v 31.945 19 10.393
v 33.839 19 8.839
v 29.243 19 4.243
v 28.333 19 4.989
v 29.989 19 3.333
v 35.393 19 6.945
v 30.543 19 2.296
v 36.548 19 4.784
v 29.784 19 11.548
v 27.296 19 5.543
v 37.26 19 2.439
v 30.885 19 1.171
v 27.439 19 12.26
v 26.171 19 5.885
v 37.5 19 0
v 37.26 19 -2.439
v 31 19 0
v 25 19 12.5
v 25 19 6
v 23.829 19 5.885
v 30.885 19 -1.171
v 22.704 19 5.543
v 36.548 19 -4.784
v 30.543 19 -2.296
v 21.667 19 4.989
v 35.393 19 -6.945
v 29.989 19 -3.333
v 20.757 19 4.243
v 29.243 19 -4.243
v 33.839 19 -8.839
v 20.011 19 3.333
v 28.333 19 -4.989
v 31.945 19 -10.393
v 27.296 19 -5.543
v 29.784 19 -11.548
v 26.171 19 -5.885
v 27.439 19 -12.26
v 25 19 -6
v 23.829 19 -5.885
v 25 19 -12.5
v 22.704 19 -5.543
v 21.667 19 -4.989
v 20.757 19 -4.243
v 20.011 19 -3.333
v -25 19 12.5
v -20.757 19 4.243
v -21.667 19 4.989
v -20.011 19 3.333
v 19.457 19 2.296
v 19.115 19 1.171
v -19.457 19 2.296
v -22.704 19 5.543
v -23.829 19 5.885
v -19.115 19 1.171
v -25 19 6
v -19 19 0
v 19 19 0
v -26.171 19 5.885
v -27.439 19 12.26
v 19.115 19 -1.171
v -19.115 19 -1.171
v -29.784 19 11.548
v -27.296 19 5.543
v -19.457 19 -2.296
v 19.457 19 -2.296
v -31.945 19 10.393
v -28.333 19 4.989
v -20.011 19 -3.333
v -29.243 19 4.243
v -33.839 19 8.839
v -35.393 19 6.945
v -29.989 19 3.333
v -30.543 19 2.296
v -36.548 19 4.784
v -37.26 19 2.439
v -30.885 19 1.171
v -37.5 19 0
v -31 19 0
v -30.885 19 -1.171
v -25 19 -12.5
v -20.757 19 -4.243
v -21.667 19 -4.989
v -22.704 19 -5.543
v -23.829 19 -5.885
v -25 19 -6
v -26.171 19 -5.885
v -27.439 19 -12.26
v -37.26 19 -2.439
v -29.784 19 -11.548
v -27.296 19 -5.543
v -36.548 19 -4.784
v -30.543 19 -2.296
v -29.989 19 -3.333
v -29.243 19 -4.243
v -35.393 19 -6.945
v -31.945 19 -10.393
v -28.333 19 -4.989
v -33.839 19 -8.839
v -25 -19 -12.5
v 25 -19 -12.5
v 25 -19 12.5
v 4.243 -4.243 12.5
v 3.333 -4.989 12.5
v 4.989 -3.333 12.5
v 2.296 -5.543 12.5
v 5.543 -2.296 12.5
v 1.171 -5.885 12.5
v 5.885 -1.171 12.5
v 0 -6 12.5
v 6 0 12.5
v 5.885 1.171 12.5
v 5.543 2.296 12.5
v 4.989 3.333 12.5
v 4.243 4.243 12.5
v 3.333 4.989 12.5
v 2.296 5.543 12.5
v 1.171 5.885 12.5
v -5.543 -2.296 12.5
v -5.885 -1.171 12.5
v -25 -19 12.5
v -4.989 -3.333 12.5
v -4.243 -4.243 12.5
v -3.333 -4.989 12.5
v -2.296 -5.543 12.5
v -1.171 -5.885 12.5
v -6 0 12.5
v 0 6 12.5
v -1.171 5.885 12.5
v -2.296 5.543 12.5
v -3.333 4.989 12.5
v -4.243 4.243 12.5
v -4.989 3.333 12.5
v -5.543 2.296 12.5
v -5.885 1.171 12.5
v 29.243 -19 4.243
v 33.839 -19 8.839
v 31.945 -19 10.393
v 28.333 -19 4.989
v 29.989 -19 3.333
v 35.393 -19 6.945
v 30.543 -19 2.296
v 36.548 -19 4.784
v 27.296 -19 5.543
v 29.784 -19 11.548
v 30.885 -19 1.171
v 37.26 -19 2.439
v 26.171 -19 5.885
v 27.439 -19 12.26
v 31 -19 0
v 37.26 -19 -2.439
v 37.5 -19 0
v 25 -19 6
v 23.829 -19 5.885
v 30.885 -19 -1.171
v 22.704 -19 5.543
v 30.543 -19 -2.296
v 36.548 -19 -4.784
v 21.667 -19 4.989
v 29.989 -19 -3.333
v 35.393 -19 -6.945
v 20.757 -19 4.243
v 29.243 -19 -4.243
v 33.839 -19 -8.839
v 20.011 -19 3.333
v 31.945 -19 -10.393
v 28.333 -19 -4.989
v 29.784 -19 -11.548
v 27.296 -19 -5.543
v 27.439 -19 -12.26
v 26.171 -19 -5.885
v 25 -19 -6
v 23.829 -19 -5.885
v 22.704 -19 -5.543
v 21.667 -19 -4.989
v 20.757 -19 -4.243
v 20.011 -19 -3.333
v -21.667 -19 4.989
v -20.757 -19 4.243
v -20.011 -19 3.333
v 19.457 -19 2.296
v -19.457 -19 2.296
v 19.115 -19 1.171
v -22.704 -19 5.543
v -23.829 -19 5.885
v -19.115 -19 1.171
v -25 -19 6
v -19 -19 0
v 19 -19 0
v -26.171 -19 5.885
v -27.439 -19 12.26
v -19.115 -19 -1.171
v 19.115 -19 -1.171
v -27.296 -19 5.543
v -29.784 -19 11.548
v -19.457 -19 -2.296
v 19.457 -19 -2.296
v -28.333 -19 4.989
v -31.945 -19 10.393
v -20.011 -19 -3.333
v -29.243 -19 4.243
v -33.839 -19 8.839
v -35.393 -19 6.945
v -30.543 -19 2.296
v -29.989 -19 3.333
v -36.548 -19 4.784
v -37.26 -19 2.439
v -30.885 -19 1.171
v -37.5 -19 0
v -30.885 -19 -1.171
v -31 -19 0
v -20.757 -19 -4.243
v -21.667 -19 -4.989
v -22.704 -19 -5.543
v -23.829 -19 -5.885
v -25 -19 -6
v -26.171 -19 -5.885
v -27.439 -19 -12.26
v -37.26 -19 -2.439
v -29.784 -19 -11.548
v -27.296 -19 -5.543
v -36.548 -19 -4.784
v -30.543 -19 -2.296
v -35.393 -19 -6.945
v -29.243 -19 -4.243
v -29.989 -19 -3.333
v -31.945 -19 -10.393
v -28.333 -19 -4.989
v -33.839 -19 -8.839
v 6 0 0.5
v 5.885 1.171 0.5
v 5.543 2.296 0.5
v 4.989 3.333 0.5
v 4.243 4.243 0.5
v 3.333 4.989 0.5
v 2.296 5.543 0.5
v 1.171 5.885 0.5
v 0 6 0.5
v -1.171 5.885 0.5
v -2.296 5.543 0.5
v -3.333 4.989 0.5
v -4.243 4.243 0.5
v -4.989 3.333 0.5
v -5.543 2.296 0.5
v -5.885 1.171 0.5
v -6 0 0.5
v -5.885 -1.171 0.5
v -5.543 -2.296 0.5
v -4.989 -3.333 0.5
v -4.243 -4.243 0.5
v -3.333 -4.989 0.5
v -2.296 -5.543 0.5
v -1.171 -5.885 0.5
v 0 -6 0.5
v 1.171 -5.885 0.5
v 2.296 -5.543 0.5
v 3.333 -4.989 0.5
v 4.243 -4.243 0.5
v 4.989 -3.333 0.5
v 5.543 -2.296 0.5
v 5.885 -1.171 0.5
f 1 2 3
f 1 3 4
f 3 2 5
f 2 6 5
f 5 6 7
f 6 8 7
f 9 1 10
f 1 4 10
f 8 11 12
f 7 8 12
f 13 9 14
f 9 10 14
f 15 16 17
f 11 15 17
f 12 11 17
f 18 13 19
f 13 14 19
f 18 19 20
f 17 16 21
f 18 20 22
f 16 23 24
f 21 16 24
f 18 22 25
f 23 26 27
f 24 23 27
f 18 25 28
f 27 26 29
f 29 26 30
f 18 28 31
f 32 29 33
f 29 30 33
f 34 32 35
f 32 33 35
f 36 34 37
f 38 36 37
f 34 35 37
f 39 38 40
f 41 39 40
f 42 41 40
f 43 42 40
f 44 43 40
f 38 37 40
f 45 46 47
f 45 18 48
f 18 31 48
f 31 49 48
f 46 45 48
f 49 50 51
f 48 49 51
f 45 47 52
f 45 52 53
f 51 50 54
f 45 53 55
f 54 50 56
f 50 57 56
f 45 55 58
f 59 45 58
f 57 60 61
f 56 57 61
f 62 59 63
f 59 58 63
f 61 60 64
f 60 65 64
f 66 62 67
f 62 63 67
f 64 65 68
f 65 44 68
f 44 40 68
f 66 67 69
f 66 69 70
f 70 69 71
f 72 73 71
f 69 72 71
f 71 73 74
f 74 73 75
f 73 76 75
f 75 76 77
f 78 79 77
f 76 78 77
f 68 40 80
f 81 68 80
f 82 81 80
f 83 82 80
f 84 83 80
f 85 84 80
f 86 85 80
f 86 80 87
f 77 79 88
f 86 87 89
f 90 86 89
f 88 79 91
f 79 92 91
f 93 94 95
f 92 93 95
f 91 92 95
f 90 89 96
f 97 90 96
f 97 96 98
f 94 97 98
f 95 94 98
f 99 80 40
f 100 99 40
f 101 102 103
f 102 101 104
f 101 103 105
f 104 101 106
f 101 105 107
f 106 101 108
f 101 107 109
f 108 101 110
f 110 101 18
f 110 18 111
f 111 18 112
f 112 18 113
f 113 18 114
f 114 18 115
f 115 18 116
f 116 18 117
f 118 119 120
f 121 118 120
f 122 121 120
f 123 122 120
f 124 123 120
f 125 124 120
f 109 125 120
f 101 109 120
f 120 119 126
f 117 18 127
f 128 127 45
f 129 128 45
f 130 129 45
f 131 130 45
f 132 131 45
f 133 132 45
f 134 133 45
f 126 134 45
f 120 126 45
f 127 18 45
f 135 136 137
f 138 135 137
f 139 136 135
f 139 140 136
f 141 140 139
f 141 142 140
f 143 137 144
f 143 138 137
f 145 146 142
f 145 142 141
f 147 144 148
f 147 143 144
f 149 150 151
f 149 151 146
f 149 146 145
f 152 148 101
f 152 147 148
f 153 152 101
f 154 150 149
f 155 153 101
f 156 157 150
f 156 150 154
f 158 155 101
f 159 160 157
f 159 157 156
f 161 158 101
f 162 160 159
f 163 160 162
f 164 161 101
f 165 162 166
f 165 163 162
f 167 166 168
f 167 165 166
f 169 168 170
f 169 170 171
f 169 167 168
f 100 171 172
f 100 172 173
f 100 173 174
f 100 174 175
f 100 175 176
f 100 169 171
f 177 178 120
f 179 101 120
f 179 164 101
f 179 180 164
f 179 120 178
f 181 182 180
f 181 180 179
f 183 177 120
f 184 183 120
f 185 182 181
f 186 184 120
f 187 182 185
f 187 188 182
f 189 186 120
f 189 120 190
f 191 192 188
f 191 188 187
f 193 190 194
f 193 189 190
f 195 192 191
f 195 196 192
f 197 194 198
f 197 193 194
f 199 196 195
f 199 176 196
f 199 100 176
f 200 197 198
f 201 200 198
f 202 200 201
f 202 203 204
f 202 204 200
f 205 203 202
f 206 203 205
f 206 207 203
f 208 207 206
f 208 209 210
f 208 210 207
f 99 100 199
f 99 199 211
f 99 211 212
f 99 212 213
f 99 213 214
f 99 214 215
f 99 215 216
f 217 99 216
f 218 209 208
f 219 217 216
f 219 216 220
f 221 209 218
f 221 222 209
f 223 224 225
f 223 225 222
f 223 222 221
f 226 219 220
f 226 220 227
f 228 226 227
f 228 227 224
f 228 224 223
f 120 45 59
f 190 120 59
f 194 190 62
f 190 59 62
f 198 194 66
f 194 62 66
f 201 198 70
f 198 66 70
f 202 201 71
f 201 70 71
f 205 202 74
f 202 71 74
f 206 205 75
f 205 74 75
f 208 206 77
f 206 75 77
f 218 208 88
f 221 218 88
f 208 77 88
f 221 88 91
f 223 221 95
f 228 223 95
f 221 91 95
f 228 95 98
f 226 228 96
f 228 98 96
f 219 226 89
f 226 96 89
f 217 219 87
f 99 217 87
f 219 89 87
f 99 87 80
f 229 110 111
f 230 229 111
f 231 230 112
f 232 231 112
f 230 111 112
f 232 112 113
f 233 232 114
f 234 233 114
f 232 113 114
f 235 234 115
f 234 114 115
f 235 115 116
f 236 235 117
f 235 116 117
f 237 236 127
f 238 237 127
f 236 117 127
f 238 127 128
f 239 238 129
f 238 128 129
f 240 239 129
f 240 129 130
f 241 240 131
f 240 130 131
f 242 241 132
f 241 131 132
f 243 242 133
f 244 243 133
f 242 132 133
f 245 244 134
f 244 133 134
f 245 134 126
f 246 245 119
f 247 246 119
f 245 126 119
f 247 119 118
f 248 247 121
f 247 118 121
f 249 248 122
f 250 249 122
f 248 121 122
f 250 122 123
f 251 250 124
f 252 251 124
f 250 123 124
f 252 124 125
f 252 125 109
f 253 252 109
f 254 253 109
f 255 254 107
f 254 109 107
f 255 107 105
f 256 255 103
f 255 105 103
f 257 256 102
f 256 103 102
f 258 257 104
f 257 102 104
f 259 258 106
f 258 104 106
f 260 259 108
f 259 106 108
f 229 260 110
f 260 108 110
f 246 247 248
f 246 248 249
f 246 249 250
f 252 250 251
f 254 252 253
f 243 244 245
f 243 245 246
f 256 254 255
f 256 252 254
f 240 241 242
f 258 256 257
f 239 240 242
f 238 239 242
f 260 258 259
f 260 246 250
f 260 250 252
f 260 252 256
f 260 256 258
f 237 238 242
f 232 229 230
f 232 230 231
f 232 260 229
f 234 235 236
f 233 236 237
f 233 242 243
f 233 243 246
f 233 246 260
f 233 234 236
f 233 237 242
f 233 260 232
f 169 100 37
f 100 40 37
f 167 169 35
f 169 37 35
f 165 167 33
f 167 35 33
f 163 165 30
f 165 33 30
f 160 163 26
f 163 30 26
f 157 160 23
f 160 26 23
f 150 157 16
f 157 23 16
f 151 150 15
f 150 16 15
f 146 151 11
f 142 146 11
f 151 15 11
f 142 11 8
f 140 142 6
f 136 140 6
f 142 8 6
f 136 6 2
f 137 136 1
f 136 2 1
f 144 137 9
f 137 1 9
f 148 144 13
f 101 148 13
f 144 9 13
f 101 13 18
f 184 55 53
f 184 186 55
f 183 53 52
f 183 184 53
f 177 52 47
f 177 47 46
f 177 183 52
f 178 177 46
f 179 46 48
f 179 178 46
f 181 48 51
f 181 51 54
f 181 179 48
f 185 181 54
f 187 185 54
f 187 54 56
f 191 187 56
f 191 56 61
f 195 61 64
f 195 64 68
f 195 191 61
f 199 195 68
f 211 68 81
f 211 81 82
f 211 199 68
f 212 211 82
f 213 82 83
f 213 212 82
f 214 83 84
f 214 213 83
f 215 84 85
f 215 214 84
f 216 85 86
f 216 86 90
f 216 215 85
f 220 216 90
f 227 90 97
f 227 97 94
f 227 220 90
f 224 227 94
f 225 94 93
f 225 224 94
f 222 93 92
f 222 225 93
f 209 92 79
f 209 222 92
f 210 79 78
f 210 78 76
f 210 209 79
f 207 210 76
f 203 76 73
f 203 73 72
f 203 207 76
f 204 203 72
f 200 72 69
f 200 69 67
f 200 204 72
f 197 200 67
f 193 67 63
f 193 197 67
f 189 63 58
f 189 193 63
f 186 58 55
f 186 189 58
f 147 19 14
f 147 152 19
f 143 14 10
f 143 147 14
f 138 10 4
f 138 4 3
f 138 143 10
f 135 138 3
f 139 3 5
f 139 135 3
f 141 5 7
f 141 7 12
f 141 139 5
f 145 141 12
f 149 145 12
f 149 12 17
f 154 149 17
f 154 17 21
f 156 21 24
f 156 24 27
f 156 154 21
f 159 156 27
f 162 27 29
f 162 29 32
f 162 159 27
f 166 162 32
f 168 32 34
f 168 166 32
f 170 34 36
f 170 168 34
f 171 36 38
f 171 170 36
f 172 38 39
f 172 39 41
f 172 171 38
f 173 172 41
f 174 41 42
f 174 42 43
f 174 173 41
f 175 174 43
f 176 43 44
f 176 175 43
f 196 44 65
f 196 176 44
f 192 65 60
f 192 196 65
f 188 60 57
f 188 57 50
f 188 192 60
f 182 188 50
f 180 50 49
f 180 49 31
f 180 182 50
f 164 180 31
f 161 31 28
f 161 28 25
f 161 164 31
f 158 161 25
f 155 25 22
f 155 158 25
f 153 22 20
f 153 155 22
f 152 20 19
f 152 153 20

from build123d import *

# Parameters (mm, degrees)
SKETCH1_R           = 6
BOSS_EXTRUDE1_DEPTH = 19
SKETCH2_R           = 6
CUT_EXTRUDE1_DEPTH  = 12


with BuildPart() as part:
    # Sketch1 → Boss-Extrude1 (new, symmetric)
    with BuildSketch(Plane(origin=(0, 0, 0), x_dir=(1, 0, 0), z_dir=(0, 1, 0))):
        with BuildLine():
            Line((-25, 12.5), (25, 12.5))
            ThreePointArc((25, 12.5), (37.5, 0), (25, -12.5))
            Line((25, -12.5), (-25, -12.5))
            ThreePointArc((-25, -12.5), (-37.5, 0), (-25, 12.5))
        make_face()
        with Locations(Location((-25, 0, 0), (0, 0, 270))):
            Circle(SKETCH1_R, mode=Mode.SUBTRACT)
        with Locations(Location((25, 0, 0), (0, 0, 270))):
            Circle(SKETCH1_R, mode=Mode.SUBTRACT)
    extrude(amount=BOSS_EXTRUDE1_DEPTH, both=True)

    # Sketch2 → Cut-Extrude1 (cut)
    with BuildSketch(Plane.XY.offset(12.5)):
        Circle(SKETCH2_R)
    extrude(amount=-CUT_EXTRUDE1_DEPTH, mode=Mode.SUBTRACT)


solid = part.part
